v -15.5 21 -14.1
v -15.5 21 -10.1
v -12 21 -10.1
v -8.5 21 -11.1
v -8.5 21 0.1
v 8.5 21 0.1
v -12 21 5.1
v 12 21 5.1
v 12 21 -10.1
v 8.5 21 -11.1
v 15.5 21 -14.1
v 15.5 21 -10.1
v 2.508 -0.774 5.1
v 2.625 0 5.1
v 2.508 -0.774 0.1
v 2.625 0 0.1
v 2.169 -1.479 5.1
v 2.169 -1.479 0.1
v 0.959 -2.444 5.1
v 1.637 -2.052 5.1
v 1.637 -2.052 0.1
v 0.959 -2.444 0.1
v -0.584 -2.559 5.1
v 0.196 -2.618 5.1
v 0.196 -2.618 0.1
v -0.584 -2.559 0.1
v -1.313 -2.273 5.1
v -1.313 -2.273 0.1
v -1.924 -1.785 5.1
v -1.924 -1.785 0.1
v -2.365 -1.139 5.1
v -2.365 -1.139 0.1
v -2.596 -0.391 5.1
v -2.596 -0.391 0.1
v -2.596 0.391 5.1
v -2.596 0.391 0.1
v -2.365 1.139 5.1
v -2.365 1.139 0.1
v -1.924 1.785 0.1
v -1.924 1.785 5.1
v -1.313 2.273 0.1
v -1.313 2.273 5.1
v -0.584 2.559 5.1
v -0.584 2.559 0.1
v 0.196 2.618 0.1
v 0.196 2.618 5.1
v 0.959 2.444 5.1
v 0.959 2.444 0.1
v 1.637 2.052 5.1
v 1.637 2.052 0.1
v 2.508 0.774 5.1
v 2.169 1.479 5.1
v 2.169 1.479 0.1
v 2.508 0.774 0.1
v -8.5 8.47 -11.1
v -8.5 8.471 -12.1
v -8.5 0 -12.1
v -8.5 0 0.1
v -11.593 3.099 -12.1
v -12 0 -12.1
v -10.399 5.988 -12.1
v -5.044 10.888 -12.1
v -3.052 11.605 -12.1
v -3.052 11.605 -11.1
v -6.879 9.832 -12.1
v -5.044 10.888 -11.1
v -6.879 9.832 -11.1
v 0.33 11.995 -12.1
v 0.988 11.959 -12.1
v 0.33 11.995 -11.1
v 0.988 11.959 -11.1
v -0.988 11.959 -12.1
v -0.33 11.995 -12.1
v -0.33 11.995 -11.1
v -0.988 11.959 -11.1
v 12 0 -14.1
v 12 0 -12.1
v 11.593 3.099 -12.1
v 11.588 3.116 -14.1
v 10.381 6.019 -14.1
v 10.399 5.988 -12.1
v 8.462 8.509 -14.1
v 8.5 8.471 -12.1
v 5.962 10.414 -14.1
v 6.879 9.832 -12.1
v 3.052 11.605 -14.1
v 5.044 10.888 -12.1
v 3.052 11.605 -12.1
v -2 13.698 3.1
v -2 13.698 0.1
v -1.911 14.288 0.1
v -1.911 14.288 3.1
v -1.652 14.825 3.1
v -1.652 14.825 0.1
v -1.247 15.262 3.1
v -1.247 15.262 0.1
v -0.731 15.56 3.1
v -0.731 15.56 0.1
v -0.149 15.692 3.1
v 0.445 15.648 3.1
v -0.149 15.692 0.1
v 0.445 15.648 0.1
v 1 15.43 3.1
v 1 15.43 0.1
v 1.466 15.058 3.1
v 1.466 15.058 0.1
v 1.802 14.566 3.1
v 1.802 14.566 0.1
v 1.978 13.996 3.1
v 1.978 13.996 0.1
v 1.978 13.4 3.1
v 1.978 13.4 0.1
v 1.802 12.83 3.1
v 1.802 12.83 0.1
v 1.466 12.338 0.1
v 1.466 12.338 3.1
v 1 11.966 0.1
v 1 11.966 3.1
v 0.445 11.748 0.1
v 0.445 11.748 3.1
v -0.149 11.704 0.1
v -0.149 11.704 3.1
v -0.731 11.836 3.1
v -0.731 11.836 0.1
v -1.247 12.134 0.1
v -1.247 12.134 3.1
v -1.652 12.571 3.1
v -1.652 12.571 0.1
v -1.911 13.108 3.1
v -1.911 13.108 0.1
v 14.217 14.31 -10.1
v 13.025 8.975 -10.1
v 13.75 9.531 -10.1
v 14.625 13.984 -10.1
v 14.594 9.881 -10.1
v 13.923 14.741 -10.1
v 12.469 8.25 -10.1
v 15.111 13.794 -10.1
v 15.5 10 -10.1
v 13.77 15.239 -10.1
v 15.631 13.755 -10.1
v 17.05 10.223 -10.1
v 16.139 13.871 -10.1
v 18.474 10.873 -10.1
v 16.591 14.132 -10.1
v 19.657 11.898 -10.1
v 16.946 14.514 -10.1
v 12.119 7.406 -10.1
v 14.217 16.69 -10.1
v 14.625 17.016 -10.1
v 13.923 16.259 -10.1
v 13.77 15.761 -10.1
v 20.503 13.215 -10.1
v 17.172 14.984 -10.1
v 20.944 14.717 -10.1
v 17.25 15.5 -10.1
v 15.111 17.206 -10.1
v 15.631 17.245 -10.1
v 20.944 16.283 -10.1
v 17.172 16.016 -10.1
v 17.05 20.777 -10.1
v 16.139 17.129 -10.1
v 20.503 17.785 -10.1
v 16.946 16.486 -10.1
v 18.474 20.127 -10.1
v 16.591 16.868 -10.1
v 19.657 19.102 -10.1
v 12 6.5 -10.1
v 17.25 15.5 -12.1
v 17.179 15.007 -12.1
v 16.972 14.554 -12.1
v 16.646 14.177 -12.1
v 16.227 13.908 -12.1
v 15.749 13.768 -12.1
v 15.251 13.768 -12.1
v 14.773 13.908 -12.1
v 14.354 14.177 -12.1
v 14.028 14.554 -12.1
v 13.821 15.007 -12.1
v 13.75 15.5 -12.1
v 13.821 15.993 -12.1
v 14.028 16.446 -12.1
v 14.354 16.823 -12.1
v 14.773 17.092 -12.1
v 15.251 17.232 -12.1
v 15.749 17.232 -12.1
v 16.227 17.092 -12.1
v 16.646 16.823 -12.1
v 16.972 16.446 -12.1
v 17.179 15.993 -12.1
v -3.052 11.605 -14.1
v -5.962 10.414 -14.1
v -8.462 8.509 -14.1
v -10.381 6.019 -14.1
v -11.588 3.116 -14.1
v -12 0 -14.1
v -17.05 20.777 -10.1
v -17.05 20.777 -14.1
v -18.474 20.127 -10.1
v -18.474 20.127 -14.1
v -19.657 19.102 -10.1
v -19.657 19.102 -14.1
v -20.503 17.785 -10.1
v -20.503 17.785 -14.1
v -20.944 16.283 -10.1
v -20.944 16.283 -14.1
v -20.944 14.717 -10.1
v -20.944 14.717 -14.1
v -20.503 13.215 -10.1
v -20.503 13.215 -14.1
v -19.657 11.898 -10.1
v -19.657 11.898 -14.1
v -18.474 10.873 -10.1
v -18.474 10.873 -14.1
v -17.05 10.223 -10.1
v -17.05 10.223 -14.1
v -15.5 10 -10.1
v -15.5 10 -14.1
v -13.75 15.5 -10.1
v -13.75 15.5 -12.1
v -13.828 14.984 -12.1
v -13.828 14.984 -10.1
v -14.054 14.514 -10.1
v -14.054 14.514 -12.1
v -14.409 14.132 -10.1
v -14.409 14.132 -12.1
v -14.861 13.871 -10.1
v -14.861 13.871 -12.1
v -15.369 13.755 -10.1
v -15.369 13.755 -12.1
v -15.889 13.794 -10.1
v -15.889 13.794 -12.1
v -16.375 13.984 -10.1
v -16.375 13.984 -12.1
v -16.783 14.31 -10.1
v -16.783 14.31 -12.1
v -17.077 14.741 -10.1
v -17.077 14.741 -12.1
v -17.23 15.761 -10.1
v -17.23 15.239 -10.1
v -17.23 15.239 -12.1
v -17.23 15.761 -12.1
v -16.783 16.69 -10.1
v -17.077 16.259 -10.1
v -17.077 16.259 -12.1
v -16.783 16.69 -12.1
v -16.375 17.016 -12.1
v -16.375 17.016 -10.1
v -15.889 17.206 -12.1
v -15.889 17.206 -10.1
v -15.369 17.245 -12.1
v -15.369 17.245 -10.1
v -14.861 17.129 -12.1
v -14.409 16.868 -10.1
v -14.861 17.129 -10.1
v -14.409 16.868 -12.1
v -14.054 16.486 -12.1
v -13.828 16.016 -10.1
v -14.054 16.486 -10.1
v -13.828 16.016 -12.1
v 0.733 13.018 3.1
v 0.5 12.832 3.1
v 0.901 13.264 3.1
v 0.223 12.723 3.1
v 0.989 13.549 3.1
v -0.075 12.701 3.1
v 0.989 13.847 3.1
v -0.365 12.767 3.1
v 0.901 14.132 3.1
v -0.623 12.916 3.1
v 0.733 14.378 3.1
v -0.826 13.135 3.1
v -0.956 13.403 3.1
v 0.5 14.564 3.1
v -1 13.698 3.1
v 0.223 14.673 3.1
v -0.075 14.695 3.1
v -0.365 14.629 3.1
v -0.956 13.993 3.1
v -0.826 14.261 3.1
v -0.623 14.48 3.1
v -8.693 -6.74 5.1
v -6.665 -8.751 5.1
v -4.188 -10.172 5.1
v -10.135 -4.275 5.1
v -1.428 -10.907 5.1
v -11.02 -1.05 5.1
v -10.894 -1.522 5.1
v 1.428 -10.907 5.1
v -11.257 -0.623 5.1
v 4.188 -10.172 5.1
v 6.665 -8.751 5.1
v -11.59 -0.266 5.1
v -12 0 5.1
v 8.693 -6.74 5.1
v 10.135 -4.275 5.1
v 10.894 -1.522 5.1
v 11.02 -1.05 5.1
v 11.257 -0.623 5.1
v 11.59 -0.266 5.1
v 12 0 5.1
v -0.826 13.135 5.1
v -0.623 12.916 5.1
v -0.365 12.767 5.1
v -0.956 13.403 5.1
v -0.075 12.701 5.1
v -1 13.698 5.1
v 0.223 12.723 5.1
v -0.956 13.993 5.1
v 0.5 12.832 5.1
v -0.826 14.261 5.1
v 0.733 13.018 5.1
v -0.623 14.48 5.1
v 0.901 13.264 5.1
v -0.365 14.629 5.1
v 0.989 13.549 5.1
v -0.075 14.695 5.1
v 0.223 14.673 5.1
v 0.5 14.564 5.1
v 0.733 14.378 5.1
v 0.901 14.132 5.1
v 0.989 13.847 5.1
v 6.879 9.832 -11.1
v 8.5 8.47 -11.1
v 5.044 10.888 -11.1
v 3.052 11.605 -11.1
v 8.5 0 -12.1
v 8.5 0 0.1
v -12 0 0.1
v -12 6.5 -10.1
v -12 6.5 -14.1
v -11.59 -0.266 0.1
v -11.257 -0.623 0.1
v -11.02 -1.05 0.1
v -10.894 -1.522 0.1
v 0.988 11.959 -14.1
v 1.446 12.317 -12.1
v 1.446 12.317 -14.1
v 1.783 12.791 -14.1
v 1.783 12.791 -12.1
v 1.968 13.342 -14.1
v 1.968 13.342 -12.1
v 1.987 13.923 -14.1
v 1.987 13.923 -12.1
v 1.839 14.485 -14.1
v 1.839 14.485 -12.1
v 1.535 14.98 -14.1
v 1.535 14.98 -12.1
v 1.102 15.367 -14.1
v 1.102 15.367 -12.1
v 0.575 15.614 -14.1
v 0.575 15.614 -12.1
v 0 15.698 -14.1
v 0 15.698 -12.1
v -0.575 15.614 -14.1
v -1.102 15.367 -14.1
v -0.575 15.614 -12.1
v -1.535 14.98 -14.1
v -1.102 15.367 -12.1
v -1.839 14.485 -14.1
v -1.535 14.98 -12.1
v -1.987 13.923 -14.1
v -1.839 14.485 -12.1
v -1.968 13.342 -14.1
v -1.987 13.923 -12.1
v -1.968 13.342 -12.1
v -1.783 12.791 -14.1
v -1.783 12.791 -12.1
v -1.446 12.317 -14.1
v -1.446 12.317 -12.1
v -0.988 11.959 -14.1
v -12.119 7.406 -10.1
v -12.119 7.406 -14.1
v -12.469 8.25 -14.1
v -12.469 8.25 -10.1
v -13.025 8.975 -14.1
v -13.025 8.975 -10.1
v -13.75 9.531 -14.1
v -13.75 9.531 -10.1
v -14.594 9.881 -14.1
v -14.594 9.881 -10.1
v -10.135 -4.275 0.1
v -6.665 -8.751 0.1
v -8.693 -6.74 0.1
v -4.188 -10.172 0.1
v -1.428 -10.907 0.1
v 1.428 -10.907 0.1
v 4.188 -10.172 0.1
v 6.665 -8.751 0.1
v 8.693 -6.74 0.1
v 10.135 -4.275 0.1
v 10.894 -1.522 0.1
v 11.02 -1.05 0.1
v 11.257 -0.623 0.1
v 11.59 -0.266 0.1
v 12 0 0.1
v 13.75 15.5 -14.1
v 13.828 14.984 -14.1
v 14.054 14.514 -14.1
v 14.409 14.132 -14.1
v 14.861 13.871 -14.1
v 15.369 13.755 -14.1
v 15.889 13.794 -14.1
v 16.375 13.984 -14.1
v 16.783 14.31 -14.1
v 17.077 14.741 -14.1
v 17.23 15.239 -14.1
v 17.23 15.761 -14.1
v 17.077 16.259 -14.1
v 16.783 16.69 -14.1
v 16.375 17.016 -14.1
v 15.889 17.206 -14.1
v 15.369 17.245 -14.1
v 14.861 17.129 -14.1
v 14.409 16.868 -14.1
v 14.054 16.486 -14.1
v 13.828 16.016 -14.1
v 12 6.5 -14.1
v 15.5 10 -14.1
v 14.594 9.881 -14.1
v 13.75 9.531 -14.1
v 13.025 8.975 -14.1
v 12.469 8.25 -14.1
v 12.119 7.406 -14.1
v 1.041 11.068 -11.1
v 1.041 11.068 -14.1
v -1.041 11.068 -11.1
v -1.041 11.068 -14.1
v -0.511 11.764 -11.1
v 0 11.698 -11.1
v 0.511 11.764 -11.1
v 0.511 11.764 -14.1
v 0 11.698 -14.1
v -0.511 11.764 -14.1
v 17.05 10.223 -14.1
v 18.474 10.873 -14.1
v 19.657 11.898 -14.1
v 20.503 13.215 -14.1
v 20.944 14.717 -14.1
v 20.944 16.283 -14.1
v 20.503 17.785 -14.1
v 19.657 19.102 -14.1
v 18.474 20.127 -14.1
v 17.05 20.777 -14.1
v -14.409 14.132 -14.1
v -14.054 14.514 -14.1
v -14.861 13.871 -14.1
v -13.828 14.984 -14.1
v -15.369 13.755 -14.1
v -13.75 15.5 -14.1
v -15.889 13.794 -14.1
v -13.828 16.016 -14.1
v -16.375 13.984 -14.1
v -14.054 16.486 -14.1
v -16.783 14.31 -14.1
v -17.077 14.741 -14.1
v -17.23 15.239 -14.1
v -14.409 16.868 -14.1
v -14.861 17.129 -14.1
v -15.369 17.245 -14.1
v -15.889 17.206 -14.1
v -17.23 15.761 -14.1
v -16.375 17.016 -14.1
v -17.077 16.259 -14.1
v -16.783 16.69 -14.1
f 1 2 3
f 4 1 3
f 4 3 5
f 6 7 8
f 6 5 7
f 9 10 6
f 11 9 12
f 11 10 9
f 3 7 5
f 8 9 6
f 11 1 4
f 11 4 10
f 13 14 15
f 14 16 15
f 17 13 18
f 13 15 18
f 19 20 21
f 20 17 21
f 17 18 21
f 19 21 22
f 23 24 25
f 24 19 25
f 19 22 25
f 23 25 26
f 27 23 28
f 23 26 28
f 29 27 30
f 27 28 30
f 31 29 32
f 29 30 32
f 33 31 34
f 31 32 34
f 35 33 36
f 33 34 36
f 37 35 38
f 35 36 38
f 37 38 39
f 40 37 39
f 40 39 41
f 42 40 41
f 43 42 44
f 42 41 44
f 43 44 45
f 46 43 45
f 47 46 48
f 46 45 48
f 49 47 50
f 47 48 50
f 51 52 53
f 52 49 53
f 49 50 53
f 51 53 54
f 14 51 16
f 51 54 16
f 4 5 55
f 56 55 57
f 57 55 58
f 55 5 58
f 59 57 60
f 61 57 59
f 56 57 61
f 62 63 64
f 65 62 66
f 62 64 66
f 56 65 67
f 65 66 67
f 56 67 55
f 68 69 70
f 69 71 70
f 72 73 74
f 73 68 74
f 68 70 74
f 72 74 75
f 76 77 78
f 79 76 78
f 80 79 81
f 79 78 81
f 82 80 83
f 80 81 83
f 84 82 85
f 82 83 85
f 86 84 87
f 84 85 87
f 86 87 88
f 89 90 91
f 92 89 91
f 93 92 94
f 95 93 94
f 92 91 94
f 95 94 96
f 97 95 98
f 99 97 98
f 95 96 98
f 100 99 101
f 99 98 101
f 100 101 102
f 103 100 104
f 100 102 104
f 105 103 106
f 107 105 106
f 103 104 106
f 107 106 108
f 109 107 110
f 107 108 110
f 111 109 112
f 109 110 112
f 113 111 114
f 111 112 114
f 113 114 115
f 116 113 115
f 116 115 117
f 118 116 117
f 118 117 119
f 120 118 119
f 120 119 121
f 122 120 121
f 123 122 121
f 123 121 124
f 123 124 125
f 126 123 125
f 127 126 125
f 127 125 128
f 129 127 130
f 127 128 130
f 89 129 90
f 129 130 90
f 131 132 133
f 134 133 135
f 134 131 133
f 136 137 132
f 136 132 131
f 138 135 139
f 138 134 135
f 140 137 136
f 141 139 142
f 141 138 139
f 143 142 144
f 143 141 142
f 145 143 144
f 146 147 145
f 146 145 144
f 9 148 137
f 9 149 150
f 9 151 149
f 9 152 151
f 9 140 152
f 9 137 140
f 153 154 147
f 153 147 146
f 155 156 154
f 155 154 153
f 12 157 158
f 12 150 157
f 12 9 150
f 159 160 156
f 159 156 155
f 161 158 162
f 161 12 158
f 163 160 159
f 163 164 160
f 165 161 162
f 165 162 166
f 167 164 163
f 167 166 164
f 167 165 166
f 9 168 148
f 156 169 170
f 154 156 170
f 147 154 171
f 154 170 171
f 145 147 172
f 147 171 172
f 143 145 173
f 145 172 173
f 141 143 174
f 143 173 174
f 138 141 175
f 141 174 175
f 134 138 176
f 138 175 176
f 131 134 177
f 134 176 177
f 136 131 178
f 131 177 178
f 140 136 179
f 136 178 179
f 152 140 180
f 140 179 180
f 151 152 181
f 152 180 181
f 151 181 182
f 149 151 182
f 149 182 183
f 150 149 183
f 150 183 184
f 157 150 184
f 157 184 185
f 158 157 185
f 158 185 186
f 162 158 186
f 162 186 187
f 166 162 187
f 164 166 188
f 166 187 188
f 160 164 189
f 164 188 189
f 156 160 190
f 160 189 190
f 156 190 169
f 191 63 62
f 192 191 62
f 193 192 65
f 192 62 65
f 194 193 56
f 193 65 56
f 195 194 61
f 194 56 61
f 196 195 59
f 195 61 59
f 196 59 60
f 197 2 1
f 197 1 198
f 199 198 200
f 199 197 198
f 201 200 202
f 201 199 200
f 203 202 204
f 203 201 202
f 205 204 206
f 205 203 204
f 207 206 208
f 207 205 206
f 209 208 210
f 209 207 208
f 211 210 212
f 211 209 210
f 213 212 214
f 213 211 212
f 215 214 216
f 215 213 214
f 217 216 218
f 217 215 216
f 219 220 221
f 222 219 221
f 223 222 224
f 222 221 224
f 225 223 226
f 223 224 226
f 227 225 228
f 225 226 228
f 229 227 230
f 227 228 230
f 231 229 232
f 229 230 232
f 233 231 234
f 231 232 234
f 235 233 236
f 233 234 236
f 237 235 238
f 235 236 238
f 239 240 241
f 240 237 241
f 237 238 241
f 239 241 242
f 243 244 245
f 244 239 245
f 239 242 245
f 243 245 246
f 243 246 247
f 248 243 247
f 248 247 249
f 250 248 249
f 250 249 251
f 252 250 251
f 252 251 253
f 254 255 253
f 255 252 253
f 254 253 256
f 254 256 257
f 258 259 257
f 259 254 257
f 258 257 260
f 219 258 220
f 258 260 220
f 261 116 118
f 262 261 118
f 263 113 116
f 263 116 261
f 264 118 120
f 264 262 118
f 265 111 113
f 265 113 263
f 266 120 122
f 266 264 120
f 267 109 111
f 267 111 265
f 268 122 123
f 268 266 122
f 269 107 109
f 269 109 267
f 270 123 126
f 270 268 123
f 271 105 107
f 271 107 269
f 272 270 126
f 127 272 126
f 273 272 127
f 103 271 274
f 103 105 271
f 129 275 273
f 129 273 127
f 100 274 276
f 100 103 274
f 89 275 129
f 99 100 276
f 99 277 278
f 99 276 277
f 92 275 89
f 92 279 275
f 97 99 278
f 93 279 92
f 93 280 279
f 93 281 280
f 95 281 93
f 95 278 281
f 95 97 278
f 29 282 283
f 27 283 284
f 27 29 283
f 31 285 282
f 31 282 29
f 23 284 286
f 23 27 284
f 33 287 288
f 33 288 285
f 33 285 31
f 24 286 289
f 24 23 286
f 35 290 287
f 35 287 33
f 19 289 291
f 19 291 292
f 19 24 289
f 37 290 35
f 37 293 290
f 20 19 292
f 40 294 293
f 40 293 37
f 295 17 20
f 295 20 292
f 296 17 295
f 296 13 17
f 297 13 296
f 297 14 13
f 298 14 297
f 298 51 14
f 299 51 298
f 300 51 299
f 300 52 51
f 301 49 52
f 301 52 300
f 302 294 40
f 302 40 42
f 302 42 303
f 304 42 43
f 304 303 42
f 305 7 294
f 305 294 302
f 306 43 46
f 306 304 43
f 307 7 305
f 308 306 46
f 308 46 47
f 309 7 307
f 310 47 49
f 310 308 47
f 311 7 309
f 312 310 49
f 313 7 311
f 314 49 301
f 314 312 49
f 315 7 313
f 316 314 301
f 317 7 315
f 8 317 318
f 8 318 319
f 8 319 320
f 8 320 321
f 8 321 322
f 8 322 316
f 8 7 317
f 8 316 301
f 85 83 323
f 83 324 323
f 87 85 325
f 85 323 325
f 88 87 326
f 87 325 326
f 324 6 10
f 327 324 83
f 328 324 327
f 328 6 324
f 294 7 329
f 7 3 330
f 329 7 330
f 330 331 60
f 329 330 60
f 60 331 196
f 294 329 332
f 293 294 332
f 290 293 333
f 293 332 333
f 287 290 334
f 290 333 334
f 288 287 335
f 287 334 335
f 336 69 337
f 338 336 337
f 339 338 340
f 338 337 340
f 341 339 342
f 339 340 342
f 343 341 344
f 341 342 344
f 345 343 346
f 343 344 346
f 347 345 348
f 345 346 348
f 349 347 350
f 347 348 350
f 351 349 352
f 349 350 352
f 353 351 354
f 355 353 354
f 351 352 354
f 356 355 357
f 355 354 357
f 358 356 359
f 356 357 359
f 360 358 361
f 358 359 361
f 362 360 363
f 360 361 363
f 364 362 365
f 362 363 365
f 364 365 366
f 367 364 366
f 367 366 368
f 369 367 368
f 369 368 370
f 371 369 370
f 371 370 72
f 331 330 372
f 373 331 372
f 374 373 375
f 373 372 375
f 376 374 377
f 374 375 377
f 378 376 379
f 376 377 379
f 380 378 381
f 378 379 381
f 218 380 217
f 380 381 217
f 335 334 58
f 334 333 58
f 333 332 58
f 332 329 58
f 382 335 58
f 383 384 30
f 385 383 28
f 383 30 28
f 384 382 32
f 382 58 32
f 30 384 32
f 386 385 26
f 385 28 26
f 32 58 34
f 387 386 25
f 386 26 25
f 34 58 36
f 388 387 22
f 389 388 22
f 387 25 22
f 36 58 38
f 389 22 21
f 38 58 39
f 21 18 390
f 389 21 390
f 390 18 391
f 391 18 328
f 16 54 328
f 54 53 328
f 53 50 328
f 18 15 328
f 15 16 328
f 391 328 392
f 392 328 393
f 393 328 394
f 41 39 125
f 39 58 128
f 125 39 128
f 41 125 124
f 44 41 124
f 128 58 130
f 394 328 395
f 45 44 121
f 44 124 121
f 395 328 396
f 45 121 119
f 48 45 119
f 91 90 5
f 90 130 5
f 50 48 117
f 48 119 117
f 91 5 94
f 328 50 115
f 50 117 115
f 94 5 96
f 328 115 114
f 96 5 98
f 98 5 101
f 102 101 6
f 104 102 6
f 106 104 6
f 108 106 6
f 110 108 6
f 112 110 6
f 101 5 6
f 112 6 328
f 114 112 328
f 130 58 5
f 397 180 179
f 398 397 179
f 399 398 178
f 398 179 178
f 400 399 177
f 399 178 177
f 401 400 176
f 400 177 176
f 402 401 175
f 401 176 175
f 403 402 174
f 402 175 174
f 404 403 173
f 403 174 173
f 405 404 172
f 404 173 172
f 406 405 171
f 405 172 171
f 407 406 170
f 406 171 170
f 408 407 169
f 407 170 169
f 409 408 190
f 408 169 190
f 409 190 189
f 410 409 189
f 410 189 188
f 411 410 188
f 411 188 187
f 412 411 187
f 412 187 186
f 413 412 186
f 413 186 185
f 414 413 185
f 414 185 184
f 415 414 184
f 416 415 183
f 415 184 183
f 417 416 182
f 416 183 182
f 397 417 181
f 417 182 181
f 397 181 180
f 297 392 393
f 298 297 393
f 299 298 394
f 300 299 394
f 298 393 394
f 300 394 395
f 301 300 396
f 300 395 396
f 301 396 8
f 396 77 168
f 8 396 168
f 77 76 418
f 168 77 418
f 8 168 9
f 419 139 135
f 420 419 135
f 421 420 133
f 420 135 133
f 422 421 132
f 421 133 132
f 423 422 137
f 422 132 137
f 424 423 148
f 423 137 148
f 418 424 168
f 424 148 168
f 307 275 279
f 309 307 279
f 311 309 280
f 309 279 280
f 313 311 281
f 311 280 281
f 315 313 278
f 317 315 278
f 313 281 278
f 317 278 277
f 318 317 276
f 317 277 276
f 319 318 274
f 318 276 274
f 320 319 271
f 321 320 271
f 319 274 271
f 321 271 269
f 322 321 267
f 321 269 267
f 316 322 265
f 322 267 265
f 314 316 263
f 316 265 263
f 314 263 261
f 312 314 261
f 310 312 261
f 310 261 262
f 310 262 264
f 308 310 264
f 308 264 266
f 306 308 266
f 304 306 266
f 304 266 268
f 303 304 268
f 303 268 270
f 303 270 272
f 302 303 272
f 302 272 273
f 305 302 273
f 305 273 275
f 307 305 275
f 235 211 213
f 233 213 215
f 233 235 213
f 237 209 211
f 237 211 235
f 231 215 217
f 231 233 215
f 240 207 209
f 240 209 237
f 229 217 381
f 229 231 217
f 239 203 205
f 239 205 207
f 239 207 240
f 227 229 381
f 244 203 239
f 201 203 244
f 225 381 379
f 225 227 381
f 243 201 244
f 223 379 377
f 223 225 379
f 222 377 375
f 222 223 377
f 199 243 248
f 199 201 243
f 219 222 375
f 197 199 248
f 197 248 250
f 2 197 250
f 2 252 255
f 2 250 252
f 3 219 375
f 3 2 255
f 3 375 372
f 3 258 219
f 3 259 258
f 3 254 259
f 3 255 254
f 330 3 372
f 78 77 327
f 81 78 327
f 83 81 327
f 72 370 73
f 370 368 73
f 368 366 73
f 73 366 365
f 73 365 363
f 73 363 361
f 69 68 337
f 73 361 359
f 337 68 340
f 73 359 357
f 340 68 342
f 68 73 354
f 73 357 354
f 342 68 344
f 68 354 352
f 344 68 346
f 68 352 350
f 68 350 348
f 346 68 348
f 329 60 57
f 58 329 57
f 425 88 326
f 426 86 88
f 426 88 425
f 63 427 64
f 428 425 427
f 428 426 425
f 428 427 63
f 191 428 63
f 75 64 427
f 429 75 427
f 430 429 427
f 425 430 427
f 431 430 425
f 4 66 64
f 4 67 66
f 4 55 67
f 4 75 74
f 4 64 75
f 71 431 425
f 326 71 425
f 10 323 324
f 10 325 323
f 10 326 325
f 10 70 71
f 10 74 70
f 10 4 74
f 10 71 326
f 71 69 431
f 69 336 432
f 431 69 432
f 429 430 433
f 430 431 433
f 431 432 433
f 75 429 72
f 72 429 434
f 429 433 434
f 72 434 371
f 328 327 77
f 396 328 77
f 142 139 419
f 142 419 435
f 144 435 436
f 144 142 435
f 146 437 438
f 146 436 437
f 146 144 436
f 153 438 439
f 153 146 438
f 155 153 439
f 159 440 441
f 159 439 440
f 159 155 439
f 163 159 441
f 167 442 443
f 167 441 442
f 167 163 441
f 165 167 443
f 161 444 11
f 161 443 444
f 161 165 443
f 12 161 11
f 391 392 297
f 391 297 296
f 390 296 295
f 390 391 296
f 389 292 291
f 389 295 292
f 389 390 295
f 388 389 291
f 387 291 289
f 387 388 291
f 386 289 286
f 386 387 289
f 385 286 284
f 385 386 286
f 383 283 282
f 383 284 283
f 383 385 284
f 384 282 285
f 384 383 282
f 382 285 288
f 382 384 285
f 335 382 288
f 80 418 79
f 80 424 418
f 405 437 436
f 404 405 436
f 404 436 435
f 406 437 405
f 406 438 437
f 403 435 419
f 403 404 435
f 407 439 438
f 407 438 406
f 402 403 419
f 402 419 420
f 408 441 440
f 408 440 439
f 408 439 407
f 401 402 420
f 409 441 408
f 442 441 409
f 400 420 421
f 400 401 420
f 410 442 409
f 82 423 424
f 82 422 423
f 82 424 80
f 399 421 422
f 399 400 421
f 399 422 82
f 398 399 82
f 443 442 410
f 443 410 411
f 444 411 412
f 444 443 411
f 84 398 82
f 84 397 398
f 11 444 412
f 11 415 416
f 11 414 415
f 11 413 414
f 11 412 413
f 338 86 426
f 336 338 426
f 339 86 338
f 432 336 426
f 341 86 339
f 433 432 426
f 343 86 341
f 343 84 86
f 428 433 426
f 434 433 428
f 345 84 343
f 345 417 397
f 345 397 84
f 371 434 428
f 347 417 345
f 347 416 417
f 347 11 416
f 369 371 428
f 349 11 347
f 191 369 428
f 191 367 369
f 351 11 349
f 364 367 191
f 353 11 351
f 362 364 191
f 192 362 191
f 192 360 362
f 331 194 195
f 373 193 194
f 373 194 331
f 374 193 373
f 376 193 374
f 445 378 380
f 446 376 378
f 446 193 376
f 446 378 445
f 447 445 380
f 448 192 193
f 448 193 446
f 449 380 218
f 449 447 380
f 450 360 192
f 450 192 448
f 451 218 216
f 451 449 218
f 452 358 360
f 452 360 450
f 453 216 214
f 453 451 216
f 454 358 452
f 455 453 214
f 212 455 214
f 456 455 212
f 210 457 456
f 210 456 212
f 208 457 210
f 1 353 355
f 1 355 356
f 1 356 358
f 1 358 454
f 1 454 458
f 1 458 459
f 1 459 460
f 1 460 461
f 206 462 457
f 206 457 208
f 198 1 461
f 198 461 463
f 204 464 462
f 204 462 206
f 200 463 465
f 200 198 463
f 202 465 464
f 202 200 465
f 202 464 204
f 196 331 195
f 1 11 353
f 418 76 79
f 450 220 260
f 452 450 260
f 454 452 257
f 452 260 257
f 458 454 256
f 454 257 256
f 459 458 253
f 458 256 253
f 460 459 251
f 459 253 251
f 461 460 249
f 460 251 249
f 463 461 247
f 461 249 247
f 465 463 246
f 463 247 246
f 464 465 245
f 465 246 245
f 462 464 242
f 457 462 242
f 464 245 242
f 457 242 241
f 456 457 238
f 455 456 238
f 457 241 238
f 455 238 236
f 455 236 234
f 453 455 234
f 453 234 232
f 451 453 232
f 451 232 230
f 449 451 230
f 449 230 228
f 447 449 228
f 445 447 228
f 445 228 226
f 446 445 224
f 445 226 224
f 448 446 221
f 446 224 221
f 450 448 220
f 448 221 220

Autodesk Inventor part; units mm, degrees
ref_plane "Work Plane1" through (0, 0, 0.1) normal (0, 0, 1) x (1, 0, 0)
sketch "Sketch2" plane through (0, 0, 0.1) normal (0, 0, 1) x (1, 0, 0)
  arc A0 (-1.5411, 2.125) -> (1.5411, 2.125) centre (0, 0) ccw construction
  line L0 (-1.5411, 2.125) -> (1.5411, 2.125) construction
  circle A1 centre (0, 0) radius 8 construction
  line L1 (1.5, 2) -> (-1.5, 2) construction
  arc A2 (-1.5, 2) -> (1.5, 2) centre (0, 0) ccw construction
  circle A3 centre (0, 0) radius 11 projected
  circle A4 centre (-15.5, -15.5) radius 1.75 construction
  circle A5 centre (15.5, -15.5) radius 1.75 construction
  circle A6 centre (15.5, 15.5) radius 1.75 construction
  circle A7 centre (-15.5, 15.5) radius 1.75 construction
  line L2 (-21, 21) -> (21, 21) construction
  line L3 (-21, -21) -> (-21, 21) construction
  line L4 (21, -21) -> (-21, -21) construction
  line L5 (21, 21) -> (21, -21) construction
  line L6 (-11, 0) -> (-11, 21)
  line L7 (-11, 21) -> (11, 21)
  line L8 (11, 21) -> (11, 0)
  circle A8 centre (0, 0) radius 2.625
  dimension "d0" = 5.25
extrude "Extrusion1" add sketch "Sketch2" along normal blind 5
sketch "Sketch3" plane through (0, 0, 0.1) normal (0, 0, -1) x (-1, 0, 0)
  circle A0 centre (0, 13.698) radius 2.2 projected
  circle A1 centre (0, 13.698) radius 2
  point P0 (0, 0)
  dimension "d3" = 4
extrude "Extrusion2" cut sketch "Sketch3" against normal blind 3 contours A1
sketch "Sketch4" plane through (0, 13.698, 3.1) normal (0, 0, -1) x (-1, 0, 0)
  circle A0 centre (0, 0) radius 1
  circle A1 centre (0, 0) radius 2 projected
  point P0 (0, -13.698)
  dimension "d6" = 2
extrude "Extrusion3" cut sketch "Sketch4" against normal through all contours A0
sketch "Sketch5" plane through (0, 0, 0.1) normal (0, 0, -1) x (-1, 0, 0)
  circle A0 centre (0, 0) radius 8 construction
  line L0 (-8, 0) -> (-8, 21) construction
  line L1 (-11, 21) -> (11, 21) construction
  line L2 (8, 0) -> (8, 21) construction
  line L3 (-8.5, 0) -> (-8.5, 21) construction
  line L4 (8.5, 0) -> (8.5, 21) construction
  circle A1 centre (0, 0) radius 8.5 construction
  line L5 (-8.5, 0) -> (-12, 0)
  line L6 (-12, 0) -> (-12, 21)
  line L7 (-12, 21) -> (-8.5, 21)
  line L8 (-8.5, 21) -> (-8.5, 0)
  line L9 (8.5, 0) -> (12, 0)
  line L10 (12, 0) -> (12, 21)
  line L11 (12, 21) -> (8.5, 21)
  line L12 (8.5, 21) -> (8.5, 0)
  line L13 (11, 21) -> (-11, 21) projected
  dimension "d9" = 0.5
  dimension "d10" = 0.5
  dimension "d11" = 0.5
  dimension "d12" = 3.5
  dimension "d13" = 3.5
ref_plane "Work Plane2" through (-11, -11, -12.1) normal (0, 0, 1) x (1, 0, 0)
extrude "Extrusion4" add sketch "Sketch5" along normal up to surface (12.2 mm away)
sketch "Sketch6" plane through (0, 0, 0.1) normal (0, 0, 1) x (1, 0, 0)
  line L0 (-11, 0) -> (-11, 21) projected
  line L1 (-11, 21) -> (-12, 21) projected
  line L2 (-12, 21) -> (-12, 0) projected
  line L3 (-12, 0) -> (-11, 0) projected
  line L4 (11, 21) -> (11, 0) projected
  line L5 (11, 0) -> (12, 0) projected
  line L6 (12, 0) -> (12, 21) projected
  line L7 (12, 21) -> (11, 21) projected
  point P0 (0, 0)
extrude "Extrusion5" add sketch "Sketch6" along normal up to surface (5 mm away)
fillet "Fillet1" radius 2 2 edges at (11, 0, 2.6) (-11, 0, 2.6)
sketch "Sketch7" plane through (12, 0, -12.1) normal (0, 0, -1) x (-1, 0, 0)
  circle A0 centre (12, 0) radius 11 projected
  line L0 (33, 21) -> (-9, 21) construction
  circle A1 centre (27.5, -15.5) radius 1.75 construction
  circle A2 centre (-3.5, -15.5) radius 1.75 construction
  circle A3 centre (-3.5, 15.5) radius 1.75 construction
  circle A4 centre (27.5, 15.5) radius 1.75 construction
  line L1 (33, 21) -> (-9, 21) construction
  line L2 (-9, 21) -> (-9, -21) construction
  line L3 (-9, -21) -> (33, -21) construction
  line L4 (33, -21) -> (33, 21) construction
  circle A5 centre (-3.5, 15.5) radius 1.75 projected
  arc A6 (-3.5, 21) -> (-3.5, 10) centre (-3.5, 15.5) ccw
  line L5 (0, 21) -> (0, 0) projected
  arc A7 (0, 6.5) -> (-3.5, 10) centre (-3.5, 6.5) ccw
  line L6 (24, 21) -> (0, 21) projected
  line L7 (-3.5, 21) -> (0, 21)
  arc A8 (1.1058, -1.5218) -> (0, 0) centre (-0.875, -1.7984) ccw projected
  arc A9 (24, 0) -> (22.8942, -1.5218) centre (24.875, -1.7984) ccw projected
  line L8 (24, 0) -> (24, 21) projected
  circle A10 centre (12, 0) radius 12
  line L9 (0, 0) -> (3.5, 0) projected
  line L10 (0, 6.5) -> (0, 0)
  line L11 (0, 21) -> (12, 21)
  line L12 (20.5, 21) -> (3.5, 21) projected
  line L13 (12, 21) -> (12, 14.698)
  circle A11 centre (12, 13.698) radius 1 projected
  line L14 (12, 12.698) -> (12, 12)
  arc A12 (12, 12) -> (0, 0) centre (12, 0) ccw
  arc A13 (12, 14.698) -> (12, 12.698) centre (12, 13.698) ccw
  point P0 (12, 0)
  point P1 (-3.125, 21)
ref_plane "Work Plane3" through (-21, -21, -14.1) normal (0, 0, 1) x (1, 0, 0)
extrude "Extrusion6" add sketch "Sketch7" along normal up to surface (2 mm away) contours L5 L6 L13 A11 L14 A10 | A7 A6 L7 L5
mirror "Mirror1" about plane through (0, 14.698, -12.1) normal (-1, 0, 0) of "Extrusion6"
ref_plane "Work Plane4" through (0, 13.698, -11.1) normal (0, 0, -1) x (-1, 0, 0)
sketch "Sketch9" plane through (0, 13.698, -11.1) normal (0, 0, -1) x (-1, 0, 0)
  circle A0 centre (0, 0) radius 5.2 projected
  circle A1 centre (0, 0) radius 2
  line L0 (-8.5, 7.302) -> (8.5, 7.302) projected
  line L1 (8.5, 7.302) -> (8.5, -5.2275) projected
  arc A2 (8.5, -5.2275) -> (-8.5, -5.2275) centre (0, -13.698) ccw projected
  line L2 (-8.5, -5.2275) -> (-8.5, 7.302) projected
  circle A3 centre (0, 0) radius 1 projected
  arc A4 (8.5, -5.2275) -> (-8.5, -5.2275) centre (0, -13.698) ccw projected
  arc A5 (8.5, -5.2275) -> (0.9883, -1.7388) centre (0, -13.698) ccw
  arc A6 (-0.9883, -1.7388) -> (-8.5, -5.2275) centre (0, -13.698) ccw
  arc A7 (0.9883, -1.7388) -> (-0.9883, -1.7388) centre (0, 0) ccw
  line L3 (-12, 7.302) -> (-12, -7.198) projected
  arc A8 (-12, -7.198) -> (-15.5, -3.698) centre (-15.5, -7.198) ccw projected
  arc A9 (-15.5, 7.302) -> (-15.5, -3.698) centre (-15.5, 1.802) ccw projected
  line L4 (-12, 7.302) -> (-15.5, 7.302) projected
  point P0 (0, -13.698)
  dimension "d26" = 4
extrude "Extrusion8" add sketch "Sketch9" along normal up to surface (1 mm away) contours A0 A2 A1 | A0 A2 L2 L0 L1 | A1 A2 | A3 picked at (-3.5209, -0.8252) picked at (-0.5576, -1.4588)
sketch "Sketch10" plane through (12, 0, -12.1) normal (0, 0, 1) x (1, 0, 0)
  circle A0 centre (-12, 13.698) radius 1 projected
  circle A1 centre (-12, 13.698) radius 2
  point P0 (-12, 0)
  dimension "d29" = 4
extrude "Extrusion9" cut sketch "Sketch10" against normal through all
sketch "Sketch11" plane through (-8.5, 0, -12.1) normal (0, 0, -1) x (-1, 0, 0)
  circle A0 centre (-8.5, 0) radius 11 construction
  arc A1 (-20.5, 0) -> (-20.5, 0) centre (-8.5, 0) ccw construction
  arc A2 (3.5, 0) -> (-20.5, 0) centre (-8.5, 0) ccw construction
  arc A3 (-9.4883, 11.9592) -> (-17, 8.4705) centre (-8.5, 0) ccw construction
  arc A4 (-11.5525, 11.6053) -> (-5.4475, 11.6053) centre (-8.5, 19) ccw
  circle A5 centre (-8.5, 13.698) radius 2 construction
  arc A6 (-9.4883, 11.9592) -> (-7.5117, 11.9592) centre (-8.5, 13.698) ccw
  arc A7 (-5.4475, 11.6053) -> (-7.5117, 11.9592) centre (-8.5, 0) ccw
  arc A8 (-9.4883, 11.9592) -> (-11.5525, 11.6053) centre (-8.5, 0) ccw
  point P0 (-8.5, 0)
  dimension "d32" = 8
ref_plane "Work Plane5" through (-21, -21, -14.1) normal (0, 0, 1) x (1, 0, 0)
extrude "Extrusion10" add sketch "Sketch11" along normal up to surface (2 mm away)
sketch "Sketch12" plane through (-8.5, 0, -12.1) normal (0, 0, 1) x (1, 0, 0)
  arc A0 (7.5117, 11.9592) -> (9.4883, 11.9592) centre (8.5, 13.698) ccw projected
  arc A1 (7.5117, 11.9592) -> (5.4475, 11.6053) centre (8.5, 0) ccw projected
  arc A2 (5.4475, 11.6053) -> (11.5525, 11.6053) centre (8.5, 19) ccw projected
  arc A3 (11.5525, 11.6053) -> (9.4883, 11.9592) centre (8.5, 0) ccw projected
  point P0 (8.5, 0)
extrude "Extrusion11" add sketch "Sketch12" along normal up to surface (1 mm away)
sketch "Sketch13" plane through (12, 0, -12.1) normal (0, 0, 1) x (1, 0, 0)
  line L0 (0, 21) -> (0, 6.5) projected
  arc A0 (3.5, 10) -> (0, 6.5) centre (3.5, 6.5) ccw projected
  arc A1 (3.5, 10) -> (3.5, 21) centre (3.5, 15.5) ccw projected
  line L1 (0, 21) -> (3.5, 21) projected
  circle A2 centre (3.5, 15.5) radius 1.75 projected
  line L2 (-24, 6.5) -> (-24, 21) projected
  line L3 (-24, 21) -> (-27.5, 21) projected
  arc A3 (-27.5, 21) -> (-27.5, 10) centre (-27.5, 15.5) ccw projected
  arc A4 (-24, 6.5) -> (-27.5, 10) centre (-27.5, 6.5) ccw projected
  circle A5 centre (-27.5, 15.5) radius 1.75 projected
  point P0 (-12, 0)
extrude "Extrusion12" add sketch "Sketch13" along normal blind 2
properties part number "Bracket"
